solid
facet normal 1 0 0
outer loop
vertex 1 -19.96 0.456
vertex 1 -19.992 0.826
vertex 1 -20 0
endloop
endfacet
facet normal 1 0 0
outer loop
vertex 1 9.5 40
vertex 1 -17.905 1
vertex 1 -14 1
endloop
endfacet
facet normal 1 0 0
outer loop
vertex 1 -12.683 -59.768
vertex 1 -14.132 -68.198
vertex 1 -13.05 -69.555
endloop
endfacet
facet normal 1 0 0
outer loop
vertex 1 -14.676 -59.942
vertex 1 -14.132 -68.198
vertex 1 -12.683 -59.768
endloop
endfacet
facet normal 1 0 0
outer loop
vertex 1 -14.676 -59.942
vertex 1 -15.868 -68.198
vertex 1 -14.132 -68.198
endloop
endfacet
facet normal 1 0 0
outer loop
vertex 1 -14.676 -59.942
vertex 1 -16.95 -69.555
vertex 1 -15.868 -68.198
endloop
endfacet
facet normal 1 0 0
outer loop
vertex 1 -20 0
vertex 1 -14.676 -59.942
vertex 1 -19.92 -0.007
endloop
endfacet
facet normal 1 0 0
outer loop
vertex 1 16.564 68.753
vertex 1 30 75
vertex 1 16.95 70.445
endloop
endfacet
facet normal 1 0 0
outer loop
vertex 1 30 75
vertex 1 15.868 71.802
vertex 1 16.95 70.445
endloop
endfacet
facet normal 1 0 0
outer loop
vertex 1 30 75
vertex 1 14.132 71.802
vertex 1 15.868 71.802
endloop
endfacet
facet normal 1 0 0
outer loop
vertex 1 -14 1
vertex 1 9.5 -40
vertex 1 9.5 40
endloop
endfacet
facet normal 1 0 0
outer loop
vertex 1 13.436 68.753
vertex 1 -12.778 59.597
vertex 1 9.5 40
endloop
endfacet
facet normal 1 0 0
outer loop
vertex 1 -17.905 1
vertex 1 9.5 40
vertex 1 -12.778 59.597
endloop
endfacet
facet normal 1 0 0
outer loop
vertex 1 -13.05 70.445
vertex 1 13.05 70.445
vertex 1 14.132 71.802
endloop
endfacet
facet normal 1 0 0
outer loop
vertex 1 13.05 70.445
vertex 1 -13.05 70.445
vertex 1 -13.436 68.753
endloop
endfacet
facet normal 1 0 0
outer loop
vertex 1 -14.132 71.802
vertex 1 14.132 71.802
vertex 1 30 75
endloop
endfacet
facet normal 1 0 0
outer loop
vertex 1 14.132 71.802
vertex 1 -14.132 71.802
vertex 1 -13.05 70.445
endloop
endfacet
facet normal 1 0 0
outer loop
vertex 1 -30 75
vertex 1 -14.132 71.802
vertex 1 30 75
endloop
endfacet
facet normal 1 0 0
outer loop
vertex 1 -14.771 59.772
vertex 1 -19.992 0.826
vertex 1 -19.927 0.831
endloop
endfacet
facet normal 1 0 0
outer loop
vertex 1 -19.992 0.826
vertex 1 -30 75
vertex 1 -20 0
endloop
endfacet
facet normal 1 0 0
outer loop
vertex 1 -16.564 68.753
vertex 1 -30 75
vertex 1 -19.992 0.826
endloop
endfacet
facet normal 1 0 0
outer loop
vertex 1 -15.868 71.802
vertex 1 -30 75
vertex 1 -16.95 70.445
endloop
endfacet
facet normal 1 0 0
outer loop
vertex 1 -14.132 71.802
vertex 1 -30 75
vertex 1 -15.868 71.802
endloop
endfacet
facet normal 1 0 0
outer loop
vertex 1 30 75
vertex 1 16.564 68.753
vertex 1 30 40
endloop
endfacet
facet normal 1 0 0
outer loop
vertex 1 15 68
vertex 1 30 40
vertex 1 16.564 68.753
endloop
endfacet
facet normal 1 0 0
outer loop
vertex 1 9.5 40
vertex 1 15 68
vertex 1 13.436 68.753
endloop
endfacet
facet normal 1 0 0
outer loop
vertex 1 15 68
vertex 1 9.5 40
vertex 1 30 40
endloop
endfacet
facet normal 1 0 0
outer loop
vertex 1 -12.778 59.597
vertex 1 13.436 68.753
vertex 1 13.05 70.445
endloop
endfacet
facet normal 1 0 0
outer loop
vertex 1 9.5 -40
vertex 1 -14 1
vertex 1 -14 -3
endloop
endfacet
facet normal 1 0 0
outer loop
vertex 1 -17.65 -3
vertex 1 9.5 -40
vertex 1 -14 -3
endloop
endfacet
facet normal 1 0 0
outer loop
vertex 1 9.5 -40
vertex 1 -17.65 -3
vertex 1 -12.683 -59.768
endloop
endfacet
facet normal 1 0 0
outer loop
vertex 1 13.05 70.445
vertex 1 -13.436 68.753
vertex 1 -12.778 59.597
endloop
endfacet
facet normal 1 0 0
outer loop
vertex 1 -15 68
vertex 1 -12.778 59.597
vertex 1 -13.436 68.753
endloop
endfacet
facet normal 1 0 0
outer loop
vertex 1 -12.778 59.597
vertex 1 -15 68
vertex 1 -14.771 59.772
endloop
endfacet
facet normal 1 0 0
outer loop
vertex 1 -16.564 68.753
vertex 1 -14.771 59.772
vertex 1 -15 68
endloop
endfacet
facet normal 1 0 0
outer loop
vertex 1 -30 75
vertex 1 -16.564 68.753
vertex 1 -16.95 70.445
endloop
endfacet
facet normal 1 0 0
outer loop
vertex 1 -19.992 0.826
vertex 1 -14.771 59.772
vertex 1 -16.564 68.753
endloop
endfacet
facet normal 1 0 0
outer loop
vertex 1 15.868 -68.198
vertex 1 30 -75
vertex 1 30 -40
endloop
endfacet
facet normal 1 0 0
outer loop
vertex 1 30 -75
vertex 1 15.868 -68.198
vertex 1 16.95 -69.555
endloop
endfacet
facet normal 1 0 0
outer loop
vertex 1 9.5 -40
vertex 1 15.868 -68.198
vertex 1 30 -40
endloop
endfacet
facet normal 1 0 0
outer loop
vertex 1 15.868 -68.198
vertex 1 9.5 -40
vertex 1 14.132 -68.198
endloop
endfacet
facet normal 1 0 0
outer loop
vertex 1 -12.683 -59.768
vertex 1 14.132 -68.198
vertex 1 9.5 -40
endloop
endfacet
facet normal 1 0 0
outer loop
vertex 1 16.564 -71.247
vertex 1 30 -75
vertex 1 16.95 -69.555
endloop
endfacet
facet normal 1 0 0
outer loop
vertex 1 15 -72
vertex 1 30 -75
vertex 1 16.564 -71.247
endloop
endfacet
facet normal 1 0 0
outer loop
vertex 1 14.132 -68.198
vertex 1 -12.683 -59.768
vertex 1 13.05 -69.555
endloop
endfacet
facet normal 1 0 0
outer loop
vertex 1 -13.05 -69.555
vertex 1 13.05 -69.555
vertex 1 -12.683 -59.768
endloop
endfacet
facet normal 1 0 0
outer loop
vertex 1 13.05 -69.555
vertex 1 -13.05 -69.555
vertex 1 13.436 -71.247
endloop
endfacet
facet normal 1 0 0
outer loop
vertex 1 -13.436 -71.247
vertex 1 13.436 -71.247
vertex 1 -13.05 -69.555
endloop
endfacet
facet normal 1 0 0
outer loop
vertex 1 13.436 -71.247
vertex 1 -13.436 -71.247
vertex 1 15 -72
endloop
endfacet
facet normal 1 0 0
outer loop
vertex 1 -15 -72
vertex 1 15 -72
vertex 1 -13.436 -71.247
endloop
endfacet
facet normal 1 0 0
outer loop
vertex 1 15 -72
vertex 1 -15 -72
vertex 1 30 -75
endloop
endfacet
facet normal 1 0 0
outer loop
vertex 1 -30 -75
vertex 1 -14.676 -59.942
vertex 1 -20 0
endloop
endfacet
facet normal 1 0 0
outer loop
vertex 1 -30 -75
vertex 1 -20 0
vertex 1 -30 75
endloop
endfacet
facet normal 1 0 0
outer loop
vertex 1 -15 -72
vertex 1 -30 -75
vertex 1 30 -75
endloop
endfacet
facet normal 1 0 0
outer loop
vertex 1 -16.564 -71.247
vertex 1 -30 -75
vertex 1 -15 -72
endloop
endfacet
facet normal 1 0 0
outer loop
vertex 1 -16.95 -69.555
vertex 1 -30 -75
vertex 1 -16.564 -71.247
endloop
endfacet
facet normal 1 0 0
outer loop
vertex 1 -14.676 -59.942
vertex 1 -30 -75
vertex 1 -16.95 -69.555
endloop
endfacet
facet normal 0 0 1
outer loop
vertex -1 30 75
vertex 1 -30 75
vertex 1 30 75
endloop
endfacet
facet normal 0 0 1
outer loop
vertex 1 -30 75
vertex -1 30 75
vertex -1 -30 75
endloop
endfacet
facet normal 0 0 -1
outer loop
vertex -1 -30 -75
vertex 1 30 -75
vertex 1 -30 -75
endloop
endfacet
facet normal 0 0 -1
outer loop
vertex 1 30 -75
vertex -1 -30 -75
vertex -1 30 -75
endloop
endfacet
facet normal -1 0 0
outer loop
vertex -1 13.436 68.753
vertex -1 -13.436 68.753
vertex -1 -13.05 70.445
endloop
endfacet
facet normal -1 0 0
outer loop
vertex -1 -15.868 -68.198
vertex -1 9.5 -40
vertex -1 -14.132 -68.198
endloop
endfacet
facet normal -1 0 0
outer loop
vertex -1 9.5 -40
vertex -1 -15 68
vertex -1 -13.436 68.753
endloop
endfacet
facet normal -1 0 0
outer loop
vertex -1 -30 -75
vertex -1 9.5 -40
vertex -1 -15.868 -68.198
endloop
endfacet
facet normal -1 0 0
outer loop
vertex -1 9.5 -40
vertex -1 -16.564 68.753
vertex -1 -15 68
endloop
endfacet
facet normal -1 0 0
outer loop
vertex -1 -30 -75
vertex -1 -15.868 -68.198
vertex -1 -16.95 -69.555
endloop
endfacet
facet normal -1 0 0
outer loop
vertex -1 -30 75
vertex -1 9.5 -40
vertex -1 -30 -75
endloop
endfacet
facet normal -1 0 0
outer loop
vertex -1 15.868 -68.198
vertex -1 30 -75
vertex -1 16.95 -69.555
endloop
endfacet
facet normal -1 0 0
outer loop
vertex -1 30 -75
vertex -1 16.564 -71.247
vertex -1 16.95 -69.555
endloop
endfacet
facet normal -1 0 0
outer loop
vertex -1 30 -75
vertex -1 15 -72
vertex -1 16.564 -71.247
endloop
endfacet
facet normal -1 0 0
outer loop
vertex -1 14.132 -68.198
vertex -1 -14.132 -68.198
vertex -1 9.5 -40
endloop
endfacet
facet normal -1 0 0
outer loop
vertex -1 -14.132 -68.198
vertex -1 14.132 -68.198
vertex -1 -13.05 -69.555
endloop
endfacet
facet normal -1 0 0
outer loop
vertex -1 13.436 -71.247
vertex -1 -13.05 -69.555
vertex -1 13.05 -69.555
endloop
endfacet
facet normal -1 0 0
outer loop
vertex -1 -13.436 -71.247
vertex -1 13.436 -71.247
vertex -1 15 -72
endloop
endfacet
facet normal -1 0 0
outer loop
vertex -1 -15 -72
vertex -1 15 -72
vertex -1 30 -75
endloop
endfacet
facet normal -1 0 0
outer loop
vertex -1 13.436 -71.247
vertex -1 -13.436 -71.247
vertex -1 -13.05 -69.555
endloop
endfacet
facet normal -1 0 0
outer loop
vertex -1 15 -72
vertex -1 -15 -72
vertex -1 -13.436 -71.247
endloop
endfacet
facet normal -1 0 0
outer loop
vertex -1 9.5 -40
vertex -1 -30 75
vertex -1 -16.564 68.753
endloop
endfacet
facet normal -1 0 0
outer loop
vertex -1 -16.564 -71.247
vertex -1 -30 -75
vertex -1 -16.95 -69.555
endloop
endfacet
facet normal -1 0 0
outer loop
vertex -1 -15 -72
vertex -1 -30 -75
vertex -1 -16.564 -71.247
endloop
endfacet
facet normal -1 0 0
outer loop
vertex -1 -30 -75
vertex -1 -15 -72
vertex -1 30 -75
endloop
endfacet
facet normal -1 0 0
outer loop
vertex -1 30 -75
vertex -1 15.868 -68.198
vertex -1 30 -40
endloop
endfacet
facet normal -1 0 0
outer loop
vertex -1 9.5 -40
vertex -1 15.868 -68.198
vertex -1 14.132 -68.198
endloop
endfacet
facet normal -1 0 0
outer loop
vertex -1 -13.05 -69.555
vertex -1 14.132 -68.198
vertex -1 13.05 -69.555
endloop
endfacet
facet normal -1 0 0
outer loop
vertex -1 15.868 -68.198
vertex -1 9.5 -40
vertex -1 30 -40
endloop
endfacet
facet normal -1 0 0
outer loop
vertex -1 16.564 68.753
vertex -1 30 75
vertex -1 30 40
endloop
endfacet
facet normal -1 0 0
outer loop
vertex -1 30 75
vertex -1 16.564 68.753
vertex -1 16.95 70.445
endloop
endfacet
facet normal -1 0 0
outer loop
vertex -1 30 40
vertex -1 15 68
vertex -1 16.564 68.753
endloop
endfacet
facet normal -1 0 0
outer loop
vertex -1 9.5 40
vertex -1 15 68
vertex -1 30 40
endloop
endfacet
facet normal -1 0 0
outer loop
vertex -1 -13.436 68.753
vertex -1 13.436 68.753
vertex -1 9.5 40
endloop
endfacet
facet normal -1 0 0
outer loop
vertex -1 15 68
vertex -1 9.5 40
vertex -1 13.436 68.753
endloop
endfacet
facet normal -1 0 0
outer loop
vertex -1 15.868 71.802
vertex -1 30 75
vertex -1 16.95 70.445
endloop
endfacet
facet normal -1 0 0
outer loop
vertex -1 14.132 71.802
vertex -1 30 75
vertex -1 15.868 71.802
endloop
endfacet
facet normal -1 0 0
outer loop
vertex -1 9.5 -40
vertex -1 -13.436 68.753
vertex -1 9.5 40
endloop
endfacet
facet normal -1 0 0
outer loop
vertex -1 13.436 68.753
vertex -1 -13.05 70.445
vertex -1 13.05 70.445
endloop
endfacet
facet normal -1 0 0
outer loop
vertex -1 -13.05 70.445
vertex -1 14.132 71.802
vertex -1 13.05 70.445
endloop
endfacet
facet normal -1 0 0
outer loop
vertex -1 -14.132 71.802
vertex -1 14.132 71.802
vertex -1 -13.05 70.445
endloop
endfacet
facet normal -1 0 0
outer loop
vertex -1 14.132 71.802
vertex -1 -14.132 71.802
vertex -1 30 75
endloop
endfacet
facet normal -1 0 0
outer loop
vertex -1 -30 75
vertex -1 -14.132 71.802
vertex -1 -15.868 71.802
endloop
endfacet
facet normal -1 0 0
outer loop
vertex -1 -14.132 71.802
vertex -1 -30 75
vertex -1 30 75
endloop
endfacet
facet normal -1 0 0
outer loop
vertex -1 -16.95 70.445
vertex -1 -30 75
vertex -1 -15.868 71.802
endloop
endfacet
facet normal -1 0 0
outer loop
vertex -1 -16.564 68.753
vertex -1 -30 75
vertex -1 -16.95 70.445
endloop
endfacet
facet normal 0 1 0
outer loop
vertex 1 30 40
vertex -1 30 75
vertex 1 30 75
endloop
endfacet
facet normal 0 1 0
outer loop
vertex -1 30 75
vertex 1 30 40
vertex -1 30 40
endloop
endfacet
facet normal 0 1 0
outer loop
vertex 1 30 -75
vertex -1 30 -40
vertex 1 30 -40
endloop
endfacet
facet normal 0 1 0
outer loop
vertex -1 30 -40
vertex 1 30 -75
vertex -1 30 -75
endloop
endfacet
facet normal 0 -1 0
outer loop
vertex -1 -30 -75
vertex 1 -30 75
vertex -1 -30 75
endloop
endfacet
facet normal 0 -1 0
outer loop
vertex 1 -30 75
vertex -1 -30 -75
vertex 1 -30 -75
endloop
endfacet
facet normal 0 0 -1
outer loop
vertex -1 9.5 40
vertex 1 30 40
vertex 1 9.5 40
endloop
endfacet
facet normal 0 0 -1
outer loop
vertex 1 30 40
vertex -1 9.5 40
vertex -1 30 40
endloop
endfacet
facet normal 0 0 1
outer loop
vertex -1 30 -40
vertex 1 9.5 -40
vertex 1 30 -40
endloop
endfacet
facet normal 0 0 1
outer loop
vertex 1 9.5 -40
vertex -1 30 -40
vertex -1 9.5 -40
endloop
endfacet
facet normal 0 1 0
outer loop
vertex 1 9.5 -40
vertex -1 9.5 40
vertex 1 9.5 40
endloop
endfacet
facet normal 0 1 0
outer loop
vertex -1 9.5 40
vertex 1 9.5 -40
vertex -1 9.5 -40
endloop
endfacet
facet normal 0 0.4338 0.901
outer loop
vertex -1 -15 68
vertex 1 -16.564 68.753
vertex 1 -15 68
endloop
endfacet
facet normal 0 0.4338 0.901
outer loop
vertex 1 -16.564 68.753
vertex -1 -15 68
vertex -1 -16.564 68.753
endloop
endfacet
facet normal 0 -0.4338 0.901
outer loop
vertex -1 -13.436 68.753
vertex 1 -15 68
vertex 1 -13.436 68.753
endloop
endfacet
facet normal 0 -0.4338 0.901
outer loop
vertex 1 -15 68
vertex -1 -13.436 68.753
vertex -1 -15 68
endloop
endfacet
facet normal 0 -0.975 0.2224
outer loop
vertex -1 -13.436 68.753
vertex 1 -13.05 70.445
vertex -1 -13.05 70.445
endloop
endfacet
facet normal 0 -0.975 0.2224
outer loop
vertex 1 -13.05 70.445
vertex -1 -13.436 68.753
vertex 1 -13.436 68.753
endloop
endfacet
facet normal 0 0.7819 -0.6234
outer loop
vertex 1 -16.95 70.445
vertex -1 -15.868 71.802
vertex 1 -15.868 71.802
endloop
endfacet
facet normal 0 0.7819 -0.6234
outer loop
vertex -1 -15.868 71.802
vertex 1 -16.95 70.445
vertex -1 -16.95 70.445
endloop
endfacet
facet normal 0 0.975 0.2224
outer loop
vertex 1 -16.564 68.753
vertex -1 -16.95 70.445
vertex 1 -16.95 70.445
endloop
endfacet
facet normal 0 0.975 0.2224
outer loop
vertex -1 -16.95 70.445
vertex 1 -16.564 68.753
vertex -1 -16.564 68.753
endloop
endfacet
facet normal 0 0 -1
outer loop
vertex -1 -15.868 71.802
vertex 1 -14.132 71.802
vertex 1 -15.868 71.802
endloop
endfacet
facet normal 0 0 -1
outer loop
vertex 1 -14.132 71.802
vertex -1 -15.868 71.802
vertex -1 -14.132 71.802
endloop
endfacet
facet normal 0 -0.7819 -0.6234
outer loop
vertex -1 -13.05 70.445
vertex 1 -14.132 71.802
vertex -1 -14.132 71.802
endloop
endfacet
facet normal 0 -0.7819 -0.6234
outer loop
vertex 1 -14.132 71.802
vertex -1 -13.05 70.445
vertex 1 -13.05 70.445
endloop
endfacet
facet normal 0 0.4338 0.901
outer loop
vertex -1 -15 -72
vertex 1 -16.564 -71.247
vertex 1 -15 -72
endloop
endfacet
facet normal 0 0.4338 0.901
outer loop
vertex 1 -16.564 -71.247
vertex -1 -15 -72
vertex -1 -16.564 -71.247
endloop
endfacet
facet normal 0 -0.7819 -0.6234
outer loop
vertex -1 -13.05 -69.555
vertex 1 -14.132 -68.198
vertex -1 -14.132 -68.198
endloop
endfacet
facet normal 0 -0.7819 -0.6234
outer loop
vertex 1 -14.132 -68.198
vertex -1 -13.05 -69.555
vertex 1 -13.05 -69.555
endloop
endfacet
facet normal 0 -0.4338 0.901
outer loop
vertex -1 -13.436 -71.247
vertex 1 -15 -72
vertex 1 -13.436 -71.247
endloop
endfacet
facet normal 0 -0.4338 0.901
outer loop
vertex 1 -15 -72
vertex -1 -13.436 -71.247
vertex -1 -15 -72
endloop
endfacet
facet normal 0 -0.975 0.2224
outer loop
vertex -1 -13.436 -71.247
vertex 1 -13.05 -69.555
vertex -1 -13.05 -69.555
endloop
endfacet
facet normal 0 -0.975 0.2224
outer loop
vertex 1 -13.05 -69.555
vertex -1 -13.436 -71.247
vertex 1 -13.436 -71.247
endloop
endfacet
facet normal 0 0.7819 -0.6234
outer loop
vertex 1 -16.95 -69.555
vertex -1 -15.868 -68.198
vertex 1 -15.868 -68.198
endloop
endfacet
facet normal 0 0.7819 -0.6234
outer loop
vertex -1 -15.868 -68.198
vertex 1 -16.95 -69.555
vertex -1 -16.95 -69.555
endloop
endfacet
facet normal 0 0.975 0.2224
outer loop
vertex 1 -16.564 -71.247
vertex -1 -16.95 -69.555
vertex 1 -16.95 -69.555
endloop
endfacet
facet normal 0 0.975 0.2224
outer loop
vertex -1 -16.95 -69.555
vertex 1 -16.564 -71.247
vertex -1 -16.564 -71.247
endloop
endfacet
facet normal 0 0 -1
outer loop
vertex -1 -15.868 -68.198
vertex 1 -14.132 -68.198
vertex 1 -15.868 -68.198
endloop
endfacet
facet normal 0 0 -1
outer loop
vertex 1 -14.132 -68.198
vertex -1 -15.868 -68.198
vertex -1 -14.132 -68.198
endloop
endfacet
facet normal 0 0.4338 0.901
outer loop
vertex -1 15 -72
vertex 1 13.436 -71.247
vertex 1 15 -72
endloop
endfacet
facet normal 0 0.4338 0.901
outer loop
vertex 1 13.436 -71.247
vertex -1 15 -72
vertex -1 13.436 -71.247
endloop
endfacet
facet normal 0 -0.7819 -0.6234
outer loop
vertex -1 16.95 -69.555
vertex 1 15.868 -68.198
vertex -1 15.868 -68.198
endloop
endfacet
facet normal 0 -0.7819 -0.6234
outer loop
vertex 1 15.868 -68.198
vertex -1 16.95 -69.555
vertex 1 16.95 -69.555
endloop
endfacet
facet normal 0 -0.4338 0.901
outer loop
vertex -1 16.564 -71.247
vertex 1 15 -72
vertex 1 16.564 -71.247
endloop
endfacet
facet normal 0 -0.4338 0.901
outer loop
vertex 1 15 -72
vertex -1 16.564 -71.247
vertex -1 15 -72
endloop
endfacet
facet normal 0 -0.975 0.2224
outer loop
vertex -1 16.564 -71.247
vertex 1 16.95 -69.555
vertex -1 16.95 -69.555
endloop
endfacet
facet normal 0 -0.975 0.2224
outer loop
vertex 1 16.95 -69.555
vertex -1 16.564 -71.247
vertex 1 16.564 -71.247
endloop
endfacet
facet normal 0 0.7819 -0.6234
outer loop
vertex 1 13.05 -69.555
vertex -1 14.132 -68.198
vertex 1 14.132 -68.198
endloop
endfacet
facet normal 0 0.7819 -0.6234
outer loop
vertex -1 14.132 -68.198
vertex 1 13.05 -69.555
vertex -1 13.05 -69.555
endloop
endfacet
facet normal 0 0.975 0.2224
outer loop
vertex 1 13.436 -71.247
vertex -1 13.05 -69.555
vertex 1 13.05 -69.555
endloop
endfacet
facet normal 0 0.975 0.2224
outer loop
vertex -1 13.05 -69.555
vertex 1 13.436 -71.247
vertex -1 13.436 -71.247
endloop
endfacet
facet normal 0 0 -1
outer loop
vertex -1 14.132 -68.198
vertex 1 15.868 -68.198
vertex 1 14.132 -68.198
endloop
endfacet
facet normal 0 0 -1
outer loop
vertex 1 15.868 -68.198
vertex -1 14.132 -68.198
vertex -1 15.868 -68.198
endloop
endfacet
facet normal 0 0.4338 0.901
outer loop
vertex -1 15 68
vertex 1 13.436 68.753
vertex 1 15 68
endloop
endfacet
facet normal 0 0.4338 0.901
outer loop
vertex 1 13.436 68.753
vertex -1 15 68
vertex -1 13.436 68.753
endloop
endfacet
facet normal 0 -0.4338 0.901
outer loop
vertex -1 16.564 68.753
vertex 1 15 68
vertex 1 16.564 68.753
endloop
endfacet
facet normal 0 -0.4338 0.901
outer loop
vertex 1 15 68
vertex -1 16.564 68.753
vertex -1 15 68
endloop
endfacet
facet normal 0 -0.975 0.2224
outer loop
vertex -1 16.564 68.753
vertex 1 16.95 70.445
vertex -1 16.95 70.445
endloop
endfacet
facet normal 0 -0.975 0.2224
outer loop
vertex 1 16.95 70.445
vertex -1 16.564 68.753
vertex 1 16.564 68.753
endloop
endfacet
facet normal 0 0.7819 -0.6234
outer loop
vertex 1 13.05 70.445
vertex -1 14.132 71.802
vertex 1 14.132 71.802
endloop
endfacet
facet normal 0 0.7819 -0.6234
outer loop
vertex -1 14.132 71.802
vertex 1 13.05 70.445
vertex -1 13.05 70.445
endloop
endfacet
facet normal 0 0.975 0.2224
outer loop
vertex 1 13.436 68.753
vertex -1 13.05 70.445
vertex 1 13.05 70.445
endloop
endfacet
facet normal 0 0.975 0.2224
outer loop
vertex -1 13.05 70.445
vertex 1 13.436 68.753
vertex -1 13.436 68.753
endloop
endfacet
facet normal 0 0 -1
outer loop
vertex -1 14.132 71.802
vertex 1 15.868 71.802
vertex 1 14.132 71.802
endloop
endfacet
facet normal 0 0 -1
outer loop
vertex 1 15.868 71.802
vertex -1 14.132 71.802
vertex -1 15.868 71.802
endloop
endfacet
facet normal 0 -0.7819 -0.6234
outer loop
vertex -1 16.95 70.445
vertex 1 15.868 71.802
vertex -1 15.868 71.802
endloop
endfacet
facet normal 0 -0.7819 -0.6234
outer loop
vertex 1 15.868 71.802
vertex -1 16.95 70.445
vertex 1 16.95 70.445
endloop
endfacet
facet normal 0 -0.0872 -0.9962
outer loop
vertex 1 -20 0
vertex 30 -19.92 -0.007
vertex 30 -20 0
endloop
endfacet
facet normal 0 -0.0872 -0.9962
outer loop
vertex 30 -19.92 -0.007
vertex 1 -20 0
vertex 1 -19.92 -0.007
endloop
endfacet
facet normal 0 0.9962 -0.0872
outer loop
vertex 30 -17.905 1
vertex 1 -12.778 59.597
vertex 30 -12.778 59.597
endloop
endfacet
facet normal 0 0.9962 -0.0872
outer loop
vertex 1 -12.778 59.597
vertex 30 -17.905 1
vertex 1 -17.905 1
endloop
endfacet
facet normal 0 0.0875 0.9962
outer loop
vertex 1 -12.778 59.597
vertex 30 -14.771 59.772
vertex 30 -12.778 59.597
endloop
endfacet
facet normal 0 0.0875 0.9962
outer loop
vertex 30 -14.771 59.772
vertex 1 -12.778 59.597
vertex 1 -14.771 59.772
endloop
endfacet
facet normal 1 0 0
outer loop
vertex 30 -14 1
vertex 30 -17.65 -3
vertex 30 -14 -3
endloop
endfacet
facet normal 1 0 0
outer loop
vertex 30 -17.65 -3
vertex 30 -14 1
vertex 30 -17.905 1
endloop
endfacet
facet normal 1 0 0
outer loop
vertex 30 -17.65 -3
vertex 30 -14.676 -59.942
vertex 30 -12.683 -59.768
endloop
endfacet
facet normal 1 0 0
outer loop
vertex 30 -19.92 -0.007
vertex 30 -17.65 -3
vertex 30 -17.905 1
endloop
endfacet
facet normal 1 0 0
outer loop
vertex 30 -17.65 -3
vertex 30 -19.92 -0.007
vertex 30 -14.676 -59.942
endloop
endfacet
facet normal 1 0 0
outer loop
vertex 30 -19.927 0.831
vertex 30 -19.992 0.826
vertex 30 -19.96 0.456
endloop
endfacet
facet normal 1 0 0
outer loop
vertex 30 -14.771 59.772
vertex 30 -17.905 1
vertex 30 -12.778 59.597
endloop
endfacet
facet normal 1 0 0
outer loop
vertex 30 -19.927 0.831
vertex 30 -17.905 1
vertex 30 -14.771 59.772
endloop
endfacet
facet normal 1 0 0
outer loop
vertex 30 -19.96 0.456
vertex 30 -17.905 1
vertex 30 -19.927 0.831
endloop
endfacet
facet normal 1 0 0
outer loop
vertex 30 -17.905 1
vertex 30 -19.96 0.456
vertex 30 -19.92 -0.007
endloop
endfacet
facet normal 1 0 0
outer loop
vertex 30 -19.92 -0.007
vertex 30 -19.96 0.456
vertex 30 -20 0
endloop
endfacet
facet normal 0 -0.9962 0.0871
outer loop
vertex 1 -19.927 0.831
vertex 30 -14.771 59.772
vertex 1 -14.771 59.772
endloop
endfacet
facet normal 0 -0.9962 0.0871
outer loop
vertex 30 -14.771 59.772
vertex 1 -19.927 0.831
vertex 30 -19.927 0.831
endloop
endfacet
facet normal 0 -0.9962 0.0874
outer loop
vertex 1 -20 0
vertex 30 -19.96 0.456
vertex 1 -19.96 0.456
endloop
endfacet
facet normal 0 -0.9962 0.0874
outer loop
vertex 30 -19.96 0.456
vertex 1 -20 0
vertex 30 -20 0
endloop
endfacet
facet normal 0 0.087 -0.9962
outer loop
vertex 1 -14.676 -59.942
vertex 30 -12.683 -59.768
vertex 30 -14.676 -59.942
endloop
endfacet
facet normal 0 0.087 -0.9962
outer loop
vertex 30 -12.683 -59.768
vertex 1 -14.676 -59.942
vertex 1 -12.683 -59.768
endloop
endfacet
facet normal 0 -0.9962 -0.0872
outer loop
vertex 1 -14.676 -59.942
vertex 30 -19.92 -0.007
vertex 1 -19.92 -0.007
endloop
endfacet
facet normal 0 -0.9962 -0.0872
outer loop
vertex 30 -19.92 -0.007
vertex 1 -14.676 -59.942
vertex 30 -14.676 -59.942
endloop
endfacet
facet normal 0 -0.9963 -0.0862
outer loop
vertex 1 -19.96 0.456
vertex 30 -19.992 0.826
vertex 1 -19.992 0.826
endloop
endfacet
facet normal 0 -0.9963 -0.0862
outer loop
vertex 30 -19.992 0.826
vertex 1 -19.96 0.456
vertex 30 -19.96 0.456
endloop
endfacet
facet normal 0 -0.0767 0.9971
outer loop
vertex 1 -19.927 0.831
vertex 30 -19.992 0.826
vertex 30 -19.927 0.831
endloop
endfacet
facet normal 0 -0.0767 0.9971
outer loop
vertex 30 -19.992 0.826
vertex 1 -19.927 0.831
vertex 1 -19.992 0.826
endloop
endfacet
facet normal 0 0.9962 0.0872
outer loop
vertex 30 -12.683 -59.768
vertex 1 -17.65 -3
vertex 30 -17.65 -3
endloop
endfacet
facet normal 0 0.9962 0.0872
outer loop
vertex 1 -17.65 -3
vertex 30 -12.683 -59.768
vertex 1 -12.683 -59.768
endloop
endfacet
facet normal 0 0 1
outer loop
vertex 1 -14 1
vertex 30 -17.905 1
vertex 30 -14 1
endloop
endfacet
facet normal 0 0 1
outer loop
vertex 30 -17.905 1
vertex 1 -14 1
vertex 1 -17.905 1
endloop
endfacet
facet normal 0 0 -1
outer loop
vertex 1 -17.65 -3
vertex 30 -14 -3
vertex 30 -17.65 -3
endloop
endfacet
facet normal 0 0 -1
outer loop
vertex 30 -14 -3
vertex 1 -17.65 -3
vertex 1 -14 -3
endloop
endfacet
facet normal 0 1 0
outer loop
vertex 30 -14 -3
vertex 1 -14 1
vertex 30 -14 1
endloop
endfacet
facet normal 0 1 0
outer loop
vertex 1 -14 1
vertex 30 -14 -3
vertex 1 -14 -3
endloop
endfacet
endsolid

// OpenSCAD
difference() {
  cube([2, 60, 150], center = true);
  translate([0, 20, 0]) cube([4, 21, 80], center = true);
  translate([0, -15, 70]) rotate([0,90,0]) cylinder(d=4, h=6, center = true);
  translate([0, -15, -70]) rotate([0,90,0]) cylinder(d=4, h=6, center = true);
  translate([0, 15, -70]) rotate([0,90,0]) cylinder(d=4, h=6, center = true);
  translate([0, 15, 70]) rotate([0,90,0]) cylinder(d=4, h=6, center = true);
} 

translate([0, -20, 0]) rotate([-5,0,0]) cube([30, 2, 60]);
translate([0, -18, 1]) rotate([-175,0,0]) cube([30, 2, 61]);
translate([0, -18, -3]) rotate([0,0,0]) cube([30, 4, 4]);
